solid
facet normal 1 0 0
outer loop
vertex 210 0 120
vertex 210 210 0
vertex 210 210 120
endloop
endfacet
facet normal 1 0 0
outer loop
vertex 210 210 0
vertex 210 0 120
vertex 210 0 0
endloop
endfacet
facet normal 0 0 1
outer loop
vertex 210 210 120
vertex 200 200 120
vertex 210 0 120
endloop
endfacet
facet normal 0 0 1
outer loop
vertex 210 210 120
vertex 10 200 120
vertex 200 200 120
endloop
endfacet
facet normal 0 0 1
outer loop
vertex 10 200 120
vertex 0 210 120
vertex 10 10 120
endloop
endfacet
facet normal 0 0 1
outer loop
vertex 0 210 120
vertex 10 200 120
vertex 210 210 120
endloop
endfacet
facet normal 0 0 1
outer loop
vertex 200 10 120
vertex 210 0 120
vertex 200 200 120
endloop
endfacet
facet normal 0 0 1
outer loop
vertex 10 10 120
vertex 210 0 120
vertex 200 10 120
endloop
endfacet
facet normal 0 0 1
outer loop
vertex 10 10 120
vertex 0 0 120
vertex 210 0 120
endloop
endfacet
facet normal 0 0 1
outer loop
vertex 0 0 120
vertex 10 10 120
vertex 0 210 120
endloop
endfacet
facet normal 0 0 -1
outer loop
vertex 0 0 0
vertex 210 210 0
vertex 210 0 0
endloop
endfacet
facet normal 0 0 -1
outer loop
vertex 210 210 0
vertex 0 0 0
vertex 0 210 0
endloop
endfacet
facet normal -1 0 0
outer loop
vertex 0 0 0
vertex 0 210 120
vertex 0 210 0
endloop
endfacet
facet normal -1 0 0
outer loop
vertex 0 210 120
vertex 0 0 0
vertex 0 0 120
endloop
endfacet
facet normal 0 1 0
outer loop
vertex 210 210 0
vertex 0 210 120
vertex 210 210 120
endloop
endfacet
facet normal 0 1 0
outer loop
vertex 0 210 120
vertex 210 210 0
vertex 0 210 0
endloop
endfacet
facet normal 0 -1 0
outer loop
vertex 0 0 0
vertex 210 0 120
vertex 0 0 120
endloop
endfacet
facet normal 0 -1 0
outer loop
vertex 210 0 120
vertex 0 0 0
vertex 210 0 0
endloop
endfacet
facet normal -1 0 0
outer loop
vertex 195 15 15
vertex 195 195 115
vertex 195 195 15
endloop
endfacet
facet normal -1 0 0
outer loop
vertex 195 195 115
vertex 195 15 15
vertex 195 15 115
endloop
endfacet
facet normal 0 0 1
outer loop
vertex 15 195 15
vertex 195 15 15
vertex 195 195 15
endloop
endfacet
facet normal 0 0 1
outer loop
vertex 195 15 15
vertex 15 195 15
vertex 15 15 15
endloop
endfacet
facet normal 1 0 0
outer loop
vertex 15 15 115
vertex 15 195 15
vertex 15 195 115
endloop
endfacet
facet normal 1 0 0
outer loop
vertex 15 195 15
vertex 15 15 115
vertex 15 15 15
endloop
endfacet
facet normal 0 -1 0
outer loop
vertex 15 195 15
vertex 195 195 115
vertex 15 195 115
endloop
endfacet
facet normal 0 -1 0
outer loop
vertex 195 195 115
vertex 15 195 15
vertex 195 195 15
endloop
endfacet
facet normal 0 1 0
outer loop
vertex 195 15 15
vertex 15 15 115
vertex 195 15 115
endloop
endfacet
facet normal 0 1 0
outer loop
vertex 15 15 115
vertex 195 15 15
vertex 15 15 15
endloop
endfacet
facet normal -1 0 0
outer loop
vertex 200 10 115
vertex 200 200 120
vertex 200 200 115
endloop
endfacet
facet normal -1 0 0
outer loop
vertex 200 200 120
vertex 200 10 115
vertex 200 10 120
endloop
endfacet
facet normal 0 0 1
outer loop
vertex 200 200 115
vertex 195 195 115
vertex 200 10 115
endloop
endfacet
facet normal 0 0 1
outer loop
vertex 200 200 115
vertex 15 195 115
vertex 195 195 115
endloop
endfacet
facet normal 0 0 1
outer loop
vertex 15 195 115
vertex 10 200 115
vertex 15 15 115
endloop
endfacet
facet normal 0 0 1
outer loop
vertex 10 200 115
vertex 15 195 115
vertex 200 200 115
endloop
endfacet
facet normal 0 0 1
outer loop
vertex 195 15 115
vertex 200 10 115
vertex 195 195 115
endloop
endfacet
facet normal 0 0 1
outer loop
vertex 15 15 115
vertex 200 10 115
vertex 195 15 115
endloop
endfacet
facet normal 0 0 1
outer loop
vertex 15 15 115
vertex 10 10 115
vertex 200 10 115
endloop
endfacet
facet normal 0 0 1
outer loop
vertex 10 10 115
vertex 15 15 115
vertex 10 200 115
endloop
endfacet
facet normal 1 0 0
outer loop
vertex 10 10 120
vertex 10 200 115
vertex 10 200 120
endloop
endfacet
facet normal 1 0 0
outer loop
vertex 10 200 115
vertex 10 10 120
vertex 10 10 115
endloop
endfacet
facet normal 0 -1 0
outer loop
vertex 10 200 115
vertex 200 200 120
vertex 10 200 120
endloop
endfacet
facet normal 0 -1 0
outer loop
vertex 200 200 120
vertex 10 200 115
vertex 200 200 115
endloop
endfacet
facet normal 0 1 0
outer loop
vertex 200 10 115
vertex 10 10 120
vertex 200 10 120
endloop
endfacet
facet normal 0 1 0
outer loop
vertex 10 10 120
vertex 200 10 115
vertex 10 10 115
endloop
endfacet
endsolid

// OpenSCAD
bLength = 180;
bWidth = 180;
binHeight = 120;
margin = 15;
lip = 5;
lipDepth = 10;
difference(){
  cube([bLength+margin*2, bWidth+margin*2, binHeight]);
  translate([margin, margin, margin])
    cube([bLength, bWidth, binHeight]);
  translate([margin-lip, margin-lip, binHeight-lip])
    cube([bLength+lip*2, bWidth+lip*2, binHeight]);
}
